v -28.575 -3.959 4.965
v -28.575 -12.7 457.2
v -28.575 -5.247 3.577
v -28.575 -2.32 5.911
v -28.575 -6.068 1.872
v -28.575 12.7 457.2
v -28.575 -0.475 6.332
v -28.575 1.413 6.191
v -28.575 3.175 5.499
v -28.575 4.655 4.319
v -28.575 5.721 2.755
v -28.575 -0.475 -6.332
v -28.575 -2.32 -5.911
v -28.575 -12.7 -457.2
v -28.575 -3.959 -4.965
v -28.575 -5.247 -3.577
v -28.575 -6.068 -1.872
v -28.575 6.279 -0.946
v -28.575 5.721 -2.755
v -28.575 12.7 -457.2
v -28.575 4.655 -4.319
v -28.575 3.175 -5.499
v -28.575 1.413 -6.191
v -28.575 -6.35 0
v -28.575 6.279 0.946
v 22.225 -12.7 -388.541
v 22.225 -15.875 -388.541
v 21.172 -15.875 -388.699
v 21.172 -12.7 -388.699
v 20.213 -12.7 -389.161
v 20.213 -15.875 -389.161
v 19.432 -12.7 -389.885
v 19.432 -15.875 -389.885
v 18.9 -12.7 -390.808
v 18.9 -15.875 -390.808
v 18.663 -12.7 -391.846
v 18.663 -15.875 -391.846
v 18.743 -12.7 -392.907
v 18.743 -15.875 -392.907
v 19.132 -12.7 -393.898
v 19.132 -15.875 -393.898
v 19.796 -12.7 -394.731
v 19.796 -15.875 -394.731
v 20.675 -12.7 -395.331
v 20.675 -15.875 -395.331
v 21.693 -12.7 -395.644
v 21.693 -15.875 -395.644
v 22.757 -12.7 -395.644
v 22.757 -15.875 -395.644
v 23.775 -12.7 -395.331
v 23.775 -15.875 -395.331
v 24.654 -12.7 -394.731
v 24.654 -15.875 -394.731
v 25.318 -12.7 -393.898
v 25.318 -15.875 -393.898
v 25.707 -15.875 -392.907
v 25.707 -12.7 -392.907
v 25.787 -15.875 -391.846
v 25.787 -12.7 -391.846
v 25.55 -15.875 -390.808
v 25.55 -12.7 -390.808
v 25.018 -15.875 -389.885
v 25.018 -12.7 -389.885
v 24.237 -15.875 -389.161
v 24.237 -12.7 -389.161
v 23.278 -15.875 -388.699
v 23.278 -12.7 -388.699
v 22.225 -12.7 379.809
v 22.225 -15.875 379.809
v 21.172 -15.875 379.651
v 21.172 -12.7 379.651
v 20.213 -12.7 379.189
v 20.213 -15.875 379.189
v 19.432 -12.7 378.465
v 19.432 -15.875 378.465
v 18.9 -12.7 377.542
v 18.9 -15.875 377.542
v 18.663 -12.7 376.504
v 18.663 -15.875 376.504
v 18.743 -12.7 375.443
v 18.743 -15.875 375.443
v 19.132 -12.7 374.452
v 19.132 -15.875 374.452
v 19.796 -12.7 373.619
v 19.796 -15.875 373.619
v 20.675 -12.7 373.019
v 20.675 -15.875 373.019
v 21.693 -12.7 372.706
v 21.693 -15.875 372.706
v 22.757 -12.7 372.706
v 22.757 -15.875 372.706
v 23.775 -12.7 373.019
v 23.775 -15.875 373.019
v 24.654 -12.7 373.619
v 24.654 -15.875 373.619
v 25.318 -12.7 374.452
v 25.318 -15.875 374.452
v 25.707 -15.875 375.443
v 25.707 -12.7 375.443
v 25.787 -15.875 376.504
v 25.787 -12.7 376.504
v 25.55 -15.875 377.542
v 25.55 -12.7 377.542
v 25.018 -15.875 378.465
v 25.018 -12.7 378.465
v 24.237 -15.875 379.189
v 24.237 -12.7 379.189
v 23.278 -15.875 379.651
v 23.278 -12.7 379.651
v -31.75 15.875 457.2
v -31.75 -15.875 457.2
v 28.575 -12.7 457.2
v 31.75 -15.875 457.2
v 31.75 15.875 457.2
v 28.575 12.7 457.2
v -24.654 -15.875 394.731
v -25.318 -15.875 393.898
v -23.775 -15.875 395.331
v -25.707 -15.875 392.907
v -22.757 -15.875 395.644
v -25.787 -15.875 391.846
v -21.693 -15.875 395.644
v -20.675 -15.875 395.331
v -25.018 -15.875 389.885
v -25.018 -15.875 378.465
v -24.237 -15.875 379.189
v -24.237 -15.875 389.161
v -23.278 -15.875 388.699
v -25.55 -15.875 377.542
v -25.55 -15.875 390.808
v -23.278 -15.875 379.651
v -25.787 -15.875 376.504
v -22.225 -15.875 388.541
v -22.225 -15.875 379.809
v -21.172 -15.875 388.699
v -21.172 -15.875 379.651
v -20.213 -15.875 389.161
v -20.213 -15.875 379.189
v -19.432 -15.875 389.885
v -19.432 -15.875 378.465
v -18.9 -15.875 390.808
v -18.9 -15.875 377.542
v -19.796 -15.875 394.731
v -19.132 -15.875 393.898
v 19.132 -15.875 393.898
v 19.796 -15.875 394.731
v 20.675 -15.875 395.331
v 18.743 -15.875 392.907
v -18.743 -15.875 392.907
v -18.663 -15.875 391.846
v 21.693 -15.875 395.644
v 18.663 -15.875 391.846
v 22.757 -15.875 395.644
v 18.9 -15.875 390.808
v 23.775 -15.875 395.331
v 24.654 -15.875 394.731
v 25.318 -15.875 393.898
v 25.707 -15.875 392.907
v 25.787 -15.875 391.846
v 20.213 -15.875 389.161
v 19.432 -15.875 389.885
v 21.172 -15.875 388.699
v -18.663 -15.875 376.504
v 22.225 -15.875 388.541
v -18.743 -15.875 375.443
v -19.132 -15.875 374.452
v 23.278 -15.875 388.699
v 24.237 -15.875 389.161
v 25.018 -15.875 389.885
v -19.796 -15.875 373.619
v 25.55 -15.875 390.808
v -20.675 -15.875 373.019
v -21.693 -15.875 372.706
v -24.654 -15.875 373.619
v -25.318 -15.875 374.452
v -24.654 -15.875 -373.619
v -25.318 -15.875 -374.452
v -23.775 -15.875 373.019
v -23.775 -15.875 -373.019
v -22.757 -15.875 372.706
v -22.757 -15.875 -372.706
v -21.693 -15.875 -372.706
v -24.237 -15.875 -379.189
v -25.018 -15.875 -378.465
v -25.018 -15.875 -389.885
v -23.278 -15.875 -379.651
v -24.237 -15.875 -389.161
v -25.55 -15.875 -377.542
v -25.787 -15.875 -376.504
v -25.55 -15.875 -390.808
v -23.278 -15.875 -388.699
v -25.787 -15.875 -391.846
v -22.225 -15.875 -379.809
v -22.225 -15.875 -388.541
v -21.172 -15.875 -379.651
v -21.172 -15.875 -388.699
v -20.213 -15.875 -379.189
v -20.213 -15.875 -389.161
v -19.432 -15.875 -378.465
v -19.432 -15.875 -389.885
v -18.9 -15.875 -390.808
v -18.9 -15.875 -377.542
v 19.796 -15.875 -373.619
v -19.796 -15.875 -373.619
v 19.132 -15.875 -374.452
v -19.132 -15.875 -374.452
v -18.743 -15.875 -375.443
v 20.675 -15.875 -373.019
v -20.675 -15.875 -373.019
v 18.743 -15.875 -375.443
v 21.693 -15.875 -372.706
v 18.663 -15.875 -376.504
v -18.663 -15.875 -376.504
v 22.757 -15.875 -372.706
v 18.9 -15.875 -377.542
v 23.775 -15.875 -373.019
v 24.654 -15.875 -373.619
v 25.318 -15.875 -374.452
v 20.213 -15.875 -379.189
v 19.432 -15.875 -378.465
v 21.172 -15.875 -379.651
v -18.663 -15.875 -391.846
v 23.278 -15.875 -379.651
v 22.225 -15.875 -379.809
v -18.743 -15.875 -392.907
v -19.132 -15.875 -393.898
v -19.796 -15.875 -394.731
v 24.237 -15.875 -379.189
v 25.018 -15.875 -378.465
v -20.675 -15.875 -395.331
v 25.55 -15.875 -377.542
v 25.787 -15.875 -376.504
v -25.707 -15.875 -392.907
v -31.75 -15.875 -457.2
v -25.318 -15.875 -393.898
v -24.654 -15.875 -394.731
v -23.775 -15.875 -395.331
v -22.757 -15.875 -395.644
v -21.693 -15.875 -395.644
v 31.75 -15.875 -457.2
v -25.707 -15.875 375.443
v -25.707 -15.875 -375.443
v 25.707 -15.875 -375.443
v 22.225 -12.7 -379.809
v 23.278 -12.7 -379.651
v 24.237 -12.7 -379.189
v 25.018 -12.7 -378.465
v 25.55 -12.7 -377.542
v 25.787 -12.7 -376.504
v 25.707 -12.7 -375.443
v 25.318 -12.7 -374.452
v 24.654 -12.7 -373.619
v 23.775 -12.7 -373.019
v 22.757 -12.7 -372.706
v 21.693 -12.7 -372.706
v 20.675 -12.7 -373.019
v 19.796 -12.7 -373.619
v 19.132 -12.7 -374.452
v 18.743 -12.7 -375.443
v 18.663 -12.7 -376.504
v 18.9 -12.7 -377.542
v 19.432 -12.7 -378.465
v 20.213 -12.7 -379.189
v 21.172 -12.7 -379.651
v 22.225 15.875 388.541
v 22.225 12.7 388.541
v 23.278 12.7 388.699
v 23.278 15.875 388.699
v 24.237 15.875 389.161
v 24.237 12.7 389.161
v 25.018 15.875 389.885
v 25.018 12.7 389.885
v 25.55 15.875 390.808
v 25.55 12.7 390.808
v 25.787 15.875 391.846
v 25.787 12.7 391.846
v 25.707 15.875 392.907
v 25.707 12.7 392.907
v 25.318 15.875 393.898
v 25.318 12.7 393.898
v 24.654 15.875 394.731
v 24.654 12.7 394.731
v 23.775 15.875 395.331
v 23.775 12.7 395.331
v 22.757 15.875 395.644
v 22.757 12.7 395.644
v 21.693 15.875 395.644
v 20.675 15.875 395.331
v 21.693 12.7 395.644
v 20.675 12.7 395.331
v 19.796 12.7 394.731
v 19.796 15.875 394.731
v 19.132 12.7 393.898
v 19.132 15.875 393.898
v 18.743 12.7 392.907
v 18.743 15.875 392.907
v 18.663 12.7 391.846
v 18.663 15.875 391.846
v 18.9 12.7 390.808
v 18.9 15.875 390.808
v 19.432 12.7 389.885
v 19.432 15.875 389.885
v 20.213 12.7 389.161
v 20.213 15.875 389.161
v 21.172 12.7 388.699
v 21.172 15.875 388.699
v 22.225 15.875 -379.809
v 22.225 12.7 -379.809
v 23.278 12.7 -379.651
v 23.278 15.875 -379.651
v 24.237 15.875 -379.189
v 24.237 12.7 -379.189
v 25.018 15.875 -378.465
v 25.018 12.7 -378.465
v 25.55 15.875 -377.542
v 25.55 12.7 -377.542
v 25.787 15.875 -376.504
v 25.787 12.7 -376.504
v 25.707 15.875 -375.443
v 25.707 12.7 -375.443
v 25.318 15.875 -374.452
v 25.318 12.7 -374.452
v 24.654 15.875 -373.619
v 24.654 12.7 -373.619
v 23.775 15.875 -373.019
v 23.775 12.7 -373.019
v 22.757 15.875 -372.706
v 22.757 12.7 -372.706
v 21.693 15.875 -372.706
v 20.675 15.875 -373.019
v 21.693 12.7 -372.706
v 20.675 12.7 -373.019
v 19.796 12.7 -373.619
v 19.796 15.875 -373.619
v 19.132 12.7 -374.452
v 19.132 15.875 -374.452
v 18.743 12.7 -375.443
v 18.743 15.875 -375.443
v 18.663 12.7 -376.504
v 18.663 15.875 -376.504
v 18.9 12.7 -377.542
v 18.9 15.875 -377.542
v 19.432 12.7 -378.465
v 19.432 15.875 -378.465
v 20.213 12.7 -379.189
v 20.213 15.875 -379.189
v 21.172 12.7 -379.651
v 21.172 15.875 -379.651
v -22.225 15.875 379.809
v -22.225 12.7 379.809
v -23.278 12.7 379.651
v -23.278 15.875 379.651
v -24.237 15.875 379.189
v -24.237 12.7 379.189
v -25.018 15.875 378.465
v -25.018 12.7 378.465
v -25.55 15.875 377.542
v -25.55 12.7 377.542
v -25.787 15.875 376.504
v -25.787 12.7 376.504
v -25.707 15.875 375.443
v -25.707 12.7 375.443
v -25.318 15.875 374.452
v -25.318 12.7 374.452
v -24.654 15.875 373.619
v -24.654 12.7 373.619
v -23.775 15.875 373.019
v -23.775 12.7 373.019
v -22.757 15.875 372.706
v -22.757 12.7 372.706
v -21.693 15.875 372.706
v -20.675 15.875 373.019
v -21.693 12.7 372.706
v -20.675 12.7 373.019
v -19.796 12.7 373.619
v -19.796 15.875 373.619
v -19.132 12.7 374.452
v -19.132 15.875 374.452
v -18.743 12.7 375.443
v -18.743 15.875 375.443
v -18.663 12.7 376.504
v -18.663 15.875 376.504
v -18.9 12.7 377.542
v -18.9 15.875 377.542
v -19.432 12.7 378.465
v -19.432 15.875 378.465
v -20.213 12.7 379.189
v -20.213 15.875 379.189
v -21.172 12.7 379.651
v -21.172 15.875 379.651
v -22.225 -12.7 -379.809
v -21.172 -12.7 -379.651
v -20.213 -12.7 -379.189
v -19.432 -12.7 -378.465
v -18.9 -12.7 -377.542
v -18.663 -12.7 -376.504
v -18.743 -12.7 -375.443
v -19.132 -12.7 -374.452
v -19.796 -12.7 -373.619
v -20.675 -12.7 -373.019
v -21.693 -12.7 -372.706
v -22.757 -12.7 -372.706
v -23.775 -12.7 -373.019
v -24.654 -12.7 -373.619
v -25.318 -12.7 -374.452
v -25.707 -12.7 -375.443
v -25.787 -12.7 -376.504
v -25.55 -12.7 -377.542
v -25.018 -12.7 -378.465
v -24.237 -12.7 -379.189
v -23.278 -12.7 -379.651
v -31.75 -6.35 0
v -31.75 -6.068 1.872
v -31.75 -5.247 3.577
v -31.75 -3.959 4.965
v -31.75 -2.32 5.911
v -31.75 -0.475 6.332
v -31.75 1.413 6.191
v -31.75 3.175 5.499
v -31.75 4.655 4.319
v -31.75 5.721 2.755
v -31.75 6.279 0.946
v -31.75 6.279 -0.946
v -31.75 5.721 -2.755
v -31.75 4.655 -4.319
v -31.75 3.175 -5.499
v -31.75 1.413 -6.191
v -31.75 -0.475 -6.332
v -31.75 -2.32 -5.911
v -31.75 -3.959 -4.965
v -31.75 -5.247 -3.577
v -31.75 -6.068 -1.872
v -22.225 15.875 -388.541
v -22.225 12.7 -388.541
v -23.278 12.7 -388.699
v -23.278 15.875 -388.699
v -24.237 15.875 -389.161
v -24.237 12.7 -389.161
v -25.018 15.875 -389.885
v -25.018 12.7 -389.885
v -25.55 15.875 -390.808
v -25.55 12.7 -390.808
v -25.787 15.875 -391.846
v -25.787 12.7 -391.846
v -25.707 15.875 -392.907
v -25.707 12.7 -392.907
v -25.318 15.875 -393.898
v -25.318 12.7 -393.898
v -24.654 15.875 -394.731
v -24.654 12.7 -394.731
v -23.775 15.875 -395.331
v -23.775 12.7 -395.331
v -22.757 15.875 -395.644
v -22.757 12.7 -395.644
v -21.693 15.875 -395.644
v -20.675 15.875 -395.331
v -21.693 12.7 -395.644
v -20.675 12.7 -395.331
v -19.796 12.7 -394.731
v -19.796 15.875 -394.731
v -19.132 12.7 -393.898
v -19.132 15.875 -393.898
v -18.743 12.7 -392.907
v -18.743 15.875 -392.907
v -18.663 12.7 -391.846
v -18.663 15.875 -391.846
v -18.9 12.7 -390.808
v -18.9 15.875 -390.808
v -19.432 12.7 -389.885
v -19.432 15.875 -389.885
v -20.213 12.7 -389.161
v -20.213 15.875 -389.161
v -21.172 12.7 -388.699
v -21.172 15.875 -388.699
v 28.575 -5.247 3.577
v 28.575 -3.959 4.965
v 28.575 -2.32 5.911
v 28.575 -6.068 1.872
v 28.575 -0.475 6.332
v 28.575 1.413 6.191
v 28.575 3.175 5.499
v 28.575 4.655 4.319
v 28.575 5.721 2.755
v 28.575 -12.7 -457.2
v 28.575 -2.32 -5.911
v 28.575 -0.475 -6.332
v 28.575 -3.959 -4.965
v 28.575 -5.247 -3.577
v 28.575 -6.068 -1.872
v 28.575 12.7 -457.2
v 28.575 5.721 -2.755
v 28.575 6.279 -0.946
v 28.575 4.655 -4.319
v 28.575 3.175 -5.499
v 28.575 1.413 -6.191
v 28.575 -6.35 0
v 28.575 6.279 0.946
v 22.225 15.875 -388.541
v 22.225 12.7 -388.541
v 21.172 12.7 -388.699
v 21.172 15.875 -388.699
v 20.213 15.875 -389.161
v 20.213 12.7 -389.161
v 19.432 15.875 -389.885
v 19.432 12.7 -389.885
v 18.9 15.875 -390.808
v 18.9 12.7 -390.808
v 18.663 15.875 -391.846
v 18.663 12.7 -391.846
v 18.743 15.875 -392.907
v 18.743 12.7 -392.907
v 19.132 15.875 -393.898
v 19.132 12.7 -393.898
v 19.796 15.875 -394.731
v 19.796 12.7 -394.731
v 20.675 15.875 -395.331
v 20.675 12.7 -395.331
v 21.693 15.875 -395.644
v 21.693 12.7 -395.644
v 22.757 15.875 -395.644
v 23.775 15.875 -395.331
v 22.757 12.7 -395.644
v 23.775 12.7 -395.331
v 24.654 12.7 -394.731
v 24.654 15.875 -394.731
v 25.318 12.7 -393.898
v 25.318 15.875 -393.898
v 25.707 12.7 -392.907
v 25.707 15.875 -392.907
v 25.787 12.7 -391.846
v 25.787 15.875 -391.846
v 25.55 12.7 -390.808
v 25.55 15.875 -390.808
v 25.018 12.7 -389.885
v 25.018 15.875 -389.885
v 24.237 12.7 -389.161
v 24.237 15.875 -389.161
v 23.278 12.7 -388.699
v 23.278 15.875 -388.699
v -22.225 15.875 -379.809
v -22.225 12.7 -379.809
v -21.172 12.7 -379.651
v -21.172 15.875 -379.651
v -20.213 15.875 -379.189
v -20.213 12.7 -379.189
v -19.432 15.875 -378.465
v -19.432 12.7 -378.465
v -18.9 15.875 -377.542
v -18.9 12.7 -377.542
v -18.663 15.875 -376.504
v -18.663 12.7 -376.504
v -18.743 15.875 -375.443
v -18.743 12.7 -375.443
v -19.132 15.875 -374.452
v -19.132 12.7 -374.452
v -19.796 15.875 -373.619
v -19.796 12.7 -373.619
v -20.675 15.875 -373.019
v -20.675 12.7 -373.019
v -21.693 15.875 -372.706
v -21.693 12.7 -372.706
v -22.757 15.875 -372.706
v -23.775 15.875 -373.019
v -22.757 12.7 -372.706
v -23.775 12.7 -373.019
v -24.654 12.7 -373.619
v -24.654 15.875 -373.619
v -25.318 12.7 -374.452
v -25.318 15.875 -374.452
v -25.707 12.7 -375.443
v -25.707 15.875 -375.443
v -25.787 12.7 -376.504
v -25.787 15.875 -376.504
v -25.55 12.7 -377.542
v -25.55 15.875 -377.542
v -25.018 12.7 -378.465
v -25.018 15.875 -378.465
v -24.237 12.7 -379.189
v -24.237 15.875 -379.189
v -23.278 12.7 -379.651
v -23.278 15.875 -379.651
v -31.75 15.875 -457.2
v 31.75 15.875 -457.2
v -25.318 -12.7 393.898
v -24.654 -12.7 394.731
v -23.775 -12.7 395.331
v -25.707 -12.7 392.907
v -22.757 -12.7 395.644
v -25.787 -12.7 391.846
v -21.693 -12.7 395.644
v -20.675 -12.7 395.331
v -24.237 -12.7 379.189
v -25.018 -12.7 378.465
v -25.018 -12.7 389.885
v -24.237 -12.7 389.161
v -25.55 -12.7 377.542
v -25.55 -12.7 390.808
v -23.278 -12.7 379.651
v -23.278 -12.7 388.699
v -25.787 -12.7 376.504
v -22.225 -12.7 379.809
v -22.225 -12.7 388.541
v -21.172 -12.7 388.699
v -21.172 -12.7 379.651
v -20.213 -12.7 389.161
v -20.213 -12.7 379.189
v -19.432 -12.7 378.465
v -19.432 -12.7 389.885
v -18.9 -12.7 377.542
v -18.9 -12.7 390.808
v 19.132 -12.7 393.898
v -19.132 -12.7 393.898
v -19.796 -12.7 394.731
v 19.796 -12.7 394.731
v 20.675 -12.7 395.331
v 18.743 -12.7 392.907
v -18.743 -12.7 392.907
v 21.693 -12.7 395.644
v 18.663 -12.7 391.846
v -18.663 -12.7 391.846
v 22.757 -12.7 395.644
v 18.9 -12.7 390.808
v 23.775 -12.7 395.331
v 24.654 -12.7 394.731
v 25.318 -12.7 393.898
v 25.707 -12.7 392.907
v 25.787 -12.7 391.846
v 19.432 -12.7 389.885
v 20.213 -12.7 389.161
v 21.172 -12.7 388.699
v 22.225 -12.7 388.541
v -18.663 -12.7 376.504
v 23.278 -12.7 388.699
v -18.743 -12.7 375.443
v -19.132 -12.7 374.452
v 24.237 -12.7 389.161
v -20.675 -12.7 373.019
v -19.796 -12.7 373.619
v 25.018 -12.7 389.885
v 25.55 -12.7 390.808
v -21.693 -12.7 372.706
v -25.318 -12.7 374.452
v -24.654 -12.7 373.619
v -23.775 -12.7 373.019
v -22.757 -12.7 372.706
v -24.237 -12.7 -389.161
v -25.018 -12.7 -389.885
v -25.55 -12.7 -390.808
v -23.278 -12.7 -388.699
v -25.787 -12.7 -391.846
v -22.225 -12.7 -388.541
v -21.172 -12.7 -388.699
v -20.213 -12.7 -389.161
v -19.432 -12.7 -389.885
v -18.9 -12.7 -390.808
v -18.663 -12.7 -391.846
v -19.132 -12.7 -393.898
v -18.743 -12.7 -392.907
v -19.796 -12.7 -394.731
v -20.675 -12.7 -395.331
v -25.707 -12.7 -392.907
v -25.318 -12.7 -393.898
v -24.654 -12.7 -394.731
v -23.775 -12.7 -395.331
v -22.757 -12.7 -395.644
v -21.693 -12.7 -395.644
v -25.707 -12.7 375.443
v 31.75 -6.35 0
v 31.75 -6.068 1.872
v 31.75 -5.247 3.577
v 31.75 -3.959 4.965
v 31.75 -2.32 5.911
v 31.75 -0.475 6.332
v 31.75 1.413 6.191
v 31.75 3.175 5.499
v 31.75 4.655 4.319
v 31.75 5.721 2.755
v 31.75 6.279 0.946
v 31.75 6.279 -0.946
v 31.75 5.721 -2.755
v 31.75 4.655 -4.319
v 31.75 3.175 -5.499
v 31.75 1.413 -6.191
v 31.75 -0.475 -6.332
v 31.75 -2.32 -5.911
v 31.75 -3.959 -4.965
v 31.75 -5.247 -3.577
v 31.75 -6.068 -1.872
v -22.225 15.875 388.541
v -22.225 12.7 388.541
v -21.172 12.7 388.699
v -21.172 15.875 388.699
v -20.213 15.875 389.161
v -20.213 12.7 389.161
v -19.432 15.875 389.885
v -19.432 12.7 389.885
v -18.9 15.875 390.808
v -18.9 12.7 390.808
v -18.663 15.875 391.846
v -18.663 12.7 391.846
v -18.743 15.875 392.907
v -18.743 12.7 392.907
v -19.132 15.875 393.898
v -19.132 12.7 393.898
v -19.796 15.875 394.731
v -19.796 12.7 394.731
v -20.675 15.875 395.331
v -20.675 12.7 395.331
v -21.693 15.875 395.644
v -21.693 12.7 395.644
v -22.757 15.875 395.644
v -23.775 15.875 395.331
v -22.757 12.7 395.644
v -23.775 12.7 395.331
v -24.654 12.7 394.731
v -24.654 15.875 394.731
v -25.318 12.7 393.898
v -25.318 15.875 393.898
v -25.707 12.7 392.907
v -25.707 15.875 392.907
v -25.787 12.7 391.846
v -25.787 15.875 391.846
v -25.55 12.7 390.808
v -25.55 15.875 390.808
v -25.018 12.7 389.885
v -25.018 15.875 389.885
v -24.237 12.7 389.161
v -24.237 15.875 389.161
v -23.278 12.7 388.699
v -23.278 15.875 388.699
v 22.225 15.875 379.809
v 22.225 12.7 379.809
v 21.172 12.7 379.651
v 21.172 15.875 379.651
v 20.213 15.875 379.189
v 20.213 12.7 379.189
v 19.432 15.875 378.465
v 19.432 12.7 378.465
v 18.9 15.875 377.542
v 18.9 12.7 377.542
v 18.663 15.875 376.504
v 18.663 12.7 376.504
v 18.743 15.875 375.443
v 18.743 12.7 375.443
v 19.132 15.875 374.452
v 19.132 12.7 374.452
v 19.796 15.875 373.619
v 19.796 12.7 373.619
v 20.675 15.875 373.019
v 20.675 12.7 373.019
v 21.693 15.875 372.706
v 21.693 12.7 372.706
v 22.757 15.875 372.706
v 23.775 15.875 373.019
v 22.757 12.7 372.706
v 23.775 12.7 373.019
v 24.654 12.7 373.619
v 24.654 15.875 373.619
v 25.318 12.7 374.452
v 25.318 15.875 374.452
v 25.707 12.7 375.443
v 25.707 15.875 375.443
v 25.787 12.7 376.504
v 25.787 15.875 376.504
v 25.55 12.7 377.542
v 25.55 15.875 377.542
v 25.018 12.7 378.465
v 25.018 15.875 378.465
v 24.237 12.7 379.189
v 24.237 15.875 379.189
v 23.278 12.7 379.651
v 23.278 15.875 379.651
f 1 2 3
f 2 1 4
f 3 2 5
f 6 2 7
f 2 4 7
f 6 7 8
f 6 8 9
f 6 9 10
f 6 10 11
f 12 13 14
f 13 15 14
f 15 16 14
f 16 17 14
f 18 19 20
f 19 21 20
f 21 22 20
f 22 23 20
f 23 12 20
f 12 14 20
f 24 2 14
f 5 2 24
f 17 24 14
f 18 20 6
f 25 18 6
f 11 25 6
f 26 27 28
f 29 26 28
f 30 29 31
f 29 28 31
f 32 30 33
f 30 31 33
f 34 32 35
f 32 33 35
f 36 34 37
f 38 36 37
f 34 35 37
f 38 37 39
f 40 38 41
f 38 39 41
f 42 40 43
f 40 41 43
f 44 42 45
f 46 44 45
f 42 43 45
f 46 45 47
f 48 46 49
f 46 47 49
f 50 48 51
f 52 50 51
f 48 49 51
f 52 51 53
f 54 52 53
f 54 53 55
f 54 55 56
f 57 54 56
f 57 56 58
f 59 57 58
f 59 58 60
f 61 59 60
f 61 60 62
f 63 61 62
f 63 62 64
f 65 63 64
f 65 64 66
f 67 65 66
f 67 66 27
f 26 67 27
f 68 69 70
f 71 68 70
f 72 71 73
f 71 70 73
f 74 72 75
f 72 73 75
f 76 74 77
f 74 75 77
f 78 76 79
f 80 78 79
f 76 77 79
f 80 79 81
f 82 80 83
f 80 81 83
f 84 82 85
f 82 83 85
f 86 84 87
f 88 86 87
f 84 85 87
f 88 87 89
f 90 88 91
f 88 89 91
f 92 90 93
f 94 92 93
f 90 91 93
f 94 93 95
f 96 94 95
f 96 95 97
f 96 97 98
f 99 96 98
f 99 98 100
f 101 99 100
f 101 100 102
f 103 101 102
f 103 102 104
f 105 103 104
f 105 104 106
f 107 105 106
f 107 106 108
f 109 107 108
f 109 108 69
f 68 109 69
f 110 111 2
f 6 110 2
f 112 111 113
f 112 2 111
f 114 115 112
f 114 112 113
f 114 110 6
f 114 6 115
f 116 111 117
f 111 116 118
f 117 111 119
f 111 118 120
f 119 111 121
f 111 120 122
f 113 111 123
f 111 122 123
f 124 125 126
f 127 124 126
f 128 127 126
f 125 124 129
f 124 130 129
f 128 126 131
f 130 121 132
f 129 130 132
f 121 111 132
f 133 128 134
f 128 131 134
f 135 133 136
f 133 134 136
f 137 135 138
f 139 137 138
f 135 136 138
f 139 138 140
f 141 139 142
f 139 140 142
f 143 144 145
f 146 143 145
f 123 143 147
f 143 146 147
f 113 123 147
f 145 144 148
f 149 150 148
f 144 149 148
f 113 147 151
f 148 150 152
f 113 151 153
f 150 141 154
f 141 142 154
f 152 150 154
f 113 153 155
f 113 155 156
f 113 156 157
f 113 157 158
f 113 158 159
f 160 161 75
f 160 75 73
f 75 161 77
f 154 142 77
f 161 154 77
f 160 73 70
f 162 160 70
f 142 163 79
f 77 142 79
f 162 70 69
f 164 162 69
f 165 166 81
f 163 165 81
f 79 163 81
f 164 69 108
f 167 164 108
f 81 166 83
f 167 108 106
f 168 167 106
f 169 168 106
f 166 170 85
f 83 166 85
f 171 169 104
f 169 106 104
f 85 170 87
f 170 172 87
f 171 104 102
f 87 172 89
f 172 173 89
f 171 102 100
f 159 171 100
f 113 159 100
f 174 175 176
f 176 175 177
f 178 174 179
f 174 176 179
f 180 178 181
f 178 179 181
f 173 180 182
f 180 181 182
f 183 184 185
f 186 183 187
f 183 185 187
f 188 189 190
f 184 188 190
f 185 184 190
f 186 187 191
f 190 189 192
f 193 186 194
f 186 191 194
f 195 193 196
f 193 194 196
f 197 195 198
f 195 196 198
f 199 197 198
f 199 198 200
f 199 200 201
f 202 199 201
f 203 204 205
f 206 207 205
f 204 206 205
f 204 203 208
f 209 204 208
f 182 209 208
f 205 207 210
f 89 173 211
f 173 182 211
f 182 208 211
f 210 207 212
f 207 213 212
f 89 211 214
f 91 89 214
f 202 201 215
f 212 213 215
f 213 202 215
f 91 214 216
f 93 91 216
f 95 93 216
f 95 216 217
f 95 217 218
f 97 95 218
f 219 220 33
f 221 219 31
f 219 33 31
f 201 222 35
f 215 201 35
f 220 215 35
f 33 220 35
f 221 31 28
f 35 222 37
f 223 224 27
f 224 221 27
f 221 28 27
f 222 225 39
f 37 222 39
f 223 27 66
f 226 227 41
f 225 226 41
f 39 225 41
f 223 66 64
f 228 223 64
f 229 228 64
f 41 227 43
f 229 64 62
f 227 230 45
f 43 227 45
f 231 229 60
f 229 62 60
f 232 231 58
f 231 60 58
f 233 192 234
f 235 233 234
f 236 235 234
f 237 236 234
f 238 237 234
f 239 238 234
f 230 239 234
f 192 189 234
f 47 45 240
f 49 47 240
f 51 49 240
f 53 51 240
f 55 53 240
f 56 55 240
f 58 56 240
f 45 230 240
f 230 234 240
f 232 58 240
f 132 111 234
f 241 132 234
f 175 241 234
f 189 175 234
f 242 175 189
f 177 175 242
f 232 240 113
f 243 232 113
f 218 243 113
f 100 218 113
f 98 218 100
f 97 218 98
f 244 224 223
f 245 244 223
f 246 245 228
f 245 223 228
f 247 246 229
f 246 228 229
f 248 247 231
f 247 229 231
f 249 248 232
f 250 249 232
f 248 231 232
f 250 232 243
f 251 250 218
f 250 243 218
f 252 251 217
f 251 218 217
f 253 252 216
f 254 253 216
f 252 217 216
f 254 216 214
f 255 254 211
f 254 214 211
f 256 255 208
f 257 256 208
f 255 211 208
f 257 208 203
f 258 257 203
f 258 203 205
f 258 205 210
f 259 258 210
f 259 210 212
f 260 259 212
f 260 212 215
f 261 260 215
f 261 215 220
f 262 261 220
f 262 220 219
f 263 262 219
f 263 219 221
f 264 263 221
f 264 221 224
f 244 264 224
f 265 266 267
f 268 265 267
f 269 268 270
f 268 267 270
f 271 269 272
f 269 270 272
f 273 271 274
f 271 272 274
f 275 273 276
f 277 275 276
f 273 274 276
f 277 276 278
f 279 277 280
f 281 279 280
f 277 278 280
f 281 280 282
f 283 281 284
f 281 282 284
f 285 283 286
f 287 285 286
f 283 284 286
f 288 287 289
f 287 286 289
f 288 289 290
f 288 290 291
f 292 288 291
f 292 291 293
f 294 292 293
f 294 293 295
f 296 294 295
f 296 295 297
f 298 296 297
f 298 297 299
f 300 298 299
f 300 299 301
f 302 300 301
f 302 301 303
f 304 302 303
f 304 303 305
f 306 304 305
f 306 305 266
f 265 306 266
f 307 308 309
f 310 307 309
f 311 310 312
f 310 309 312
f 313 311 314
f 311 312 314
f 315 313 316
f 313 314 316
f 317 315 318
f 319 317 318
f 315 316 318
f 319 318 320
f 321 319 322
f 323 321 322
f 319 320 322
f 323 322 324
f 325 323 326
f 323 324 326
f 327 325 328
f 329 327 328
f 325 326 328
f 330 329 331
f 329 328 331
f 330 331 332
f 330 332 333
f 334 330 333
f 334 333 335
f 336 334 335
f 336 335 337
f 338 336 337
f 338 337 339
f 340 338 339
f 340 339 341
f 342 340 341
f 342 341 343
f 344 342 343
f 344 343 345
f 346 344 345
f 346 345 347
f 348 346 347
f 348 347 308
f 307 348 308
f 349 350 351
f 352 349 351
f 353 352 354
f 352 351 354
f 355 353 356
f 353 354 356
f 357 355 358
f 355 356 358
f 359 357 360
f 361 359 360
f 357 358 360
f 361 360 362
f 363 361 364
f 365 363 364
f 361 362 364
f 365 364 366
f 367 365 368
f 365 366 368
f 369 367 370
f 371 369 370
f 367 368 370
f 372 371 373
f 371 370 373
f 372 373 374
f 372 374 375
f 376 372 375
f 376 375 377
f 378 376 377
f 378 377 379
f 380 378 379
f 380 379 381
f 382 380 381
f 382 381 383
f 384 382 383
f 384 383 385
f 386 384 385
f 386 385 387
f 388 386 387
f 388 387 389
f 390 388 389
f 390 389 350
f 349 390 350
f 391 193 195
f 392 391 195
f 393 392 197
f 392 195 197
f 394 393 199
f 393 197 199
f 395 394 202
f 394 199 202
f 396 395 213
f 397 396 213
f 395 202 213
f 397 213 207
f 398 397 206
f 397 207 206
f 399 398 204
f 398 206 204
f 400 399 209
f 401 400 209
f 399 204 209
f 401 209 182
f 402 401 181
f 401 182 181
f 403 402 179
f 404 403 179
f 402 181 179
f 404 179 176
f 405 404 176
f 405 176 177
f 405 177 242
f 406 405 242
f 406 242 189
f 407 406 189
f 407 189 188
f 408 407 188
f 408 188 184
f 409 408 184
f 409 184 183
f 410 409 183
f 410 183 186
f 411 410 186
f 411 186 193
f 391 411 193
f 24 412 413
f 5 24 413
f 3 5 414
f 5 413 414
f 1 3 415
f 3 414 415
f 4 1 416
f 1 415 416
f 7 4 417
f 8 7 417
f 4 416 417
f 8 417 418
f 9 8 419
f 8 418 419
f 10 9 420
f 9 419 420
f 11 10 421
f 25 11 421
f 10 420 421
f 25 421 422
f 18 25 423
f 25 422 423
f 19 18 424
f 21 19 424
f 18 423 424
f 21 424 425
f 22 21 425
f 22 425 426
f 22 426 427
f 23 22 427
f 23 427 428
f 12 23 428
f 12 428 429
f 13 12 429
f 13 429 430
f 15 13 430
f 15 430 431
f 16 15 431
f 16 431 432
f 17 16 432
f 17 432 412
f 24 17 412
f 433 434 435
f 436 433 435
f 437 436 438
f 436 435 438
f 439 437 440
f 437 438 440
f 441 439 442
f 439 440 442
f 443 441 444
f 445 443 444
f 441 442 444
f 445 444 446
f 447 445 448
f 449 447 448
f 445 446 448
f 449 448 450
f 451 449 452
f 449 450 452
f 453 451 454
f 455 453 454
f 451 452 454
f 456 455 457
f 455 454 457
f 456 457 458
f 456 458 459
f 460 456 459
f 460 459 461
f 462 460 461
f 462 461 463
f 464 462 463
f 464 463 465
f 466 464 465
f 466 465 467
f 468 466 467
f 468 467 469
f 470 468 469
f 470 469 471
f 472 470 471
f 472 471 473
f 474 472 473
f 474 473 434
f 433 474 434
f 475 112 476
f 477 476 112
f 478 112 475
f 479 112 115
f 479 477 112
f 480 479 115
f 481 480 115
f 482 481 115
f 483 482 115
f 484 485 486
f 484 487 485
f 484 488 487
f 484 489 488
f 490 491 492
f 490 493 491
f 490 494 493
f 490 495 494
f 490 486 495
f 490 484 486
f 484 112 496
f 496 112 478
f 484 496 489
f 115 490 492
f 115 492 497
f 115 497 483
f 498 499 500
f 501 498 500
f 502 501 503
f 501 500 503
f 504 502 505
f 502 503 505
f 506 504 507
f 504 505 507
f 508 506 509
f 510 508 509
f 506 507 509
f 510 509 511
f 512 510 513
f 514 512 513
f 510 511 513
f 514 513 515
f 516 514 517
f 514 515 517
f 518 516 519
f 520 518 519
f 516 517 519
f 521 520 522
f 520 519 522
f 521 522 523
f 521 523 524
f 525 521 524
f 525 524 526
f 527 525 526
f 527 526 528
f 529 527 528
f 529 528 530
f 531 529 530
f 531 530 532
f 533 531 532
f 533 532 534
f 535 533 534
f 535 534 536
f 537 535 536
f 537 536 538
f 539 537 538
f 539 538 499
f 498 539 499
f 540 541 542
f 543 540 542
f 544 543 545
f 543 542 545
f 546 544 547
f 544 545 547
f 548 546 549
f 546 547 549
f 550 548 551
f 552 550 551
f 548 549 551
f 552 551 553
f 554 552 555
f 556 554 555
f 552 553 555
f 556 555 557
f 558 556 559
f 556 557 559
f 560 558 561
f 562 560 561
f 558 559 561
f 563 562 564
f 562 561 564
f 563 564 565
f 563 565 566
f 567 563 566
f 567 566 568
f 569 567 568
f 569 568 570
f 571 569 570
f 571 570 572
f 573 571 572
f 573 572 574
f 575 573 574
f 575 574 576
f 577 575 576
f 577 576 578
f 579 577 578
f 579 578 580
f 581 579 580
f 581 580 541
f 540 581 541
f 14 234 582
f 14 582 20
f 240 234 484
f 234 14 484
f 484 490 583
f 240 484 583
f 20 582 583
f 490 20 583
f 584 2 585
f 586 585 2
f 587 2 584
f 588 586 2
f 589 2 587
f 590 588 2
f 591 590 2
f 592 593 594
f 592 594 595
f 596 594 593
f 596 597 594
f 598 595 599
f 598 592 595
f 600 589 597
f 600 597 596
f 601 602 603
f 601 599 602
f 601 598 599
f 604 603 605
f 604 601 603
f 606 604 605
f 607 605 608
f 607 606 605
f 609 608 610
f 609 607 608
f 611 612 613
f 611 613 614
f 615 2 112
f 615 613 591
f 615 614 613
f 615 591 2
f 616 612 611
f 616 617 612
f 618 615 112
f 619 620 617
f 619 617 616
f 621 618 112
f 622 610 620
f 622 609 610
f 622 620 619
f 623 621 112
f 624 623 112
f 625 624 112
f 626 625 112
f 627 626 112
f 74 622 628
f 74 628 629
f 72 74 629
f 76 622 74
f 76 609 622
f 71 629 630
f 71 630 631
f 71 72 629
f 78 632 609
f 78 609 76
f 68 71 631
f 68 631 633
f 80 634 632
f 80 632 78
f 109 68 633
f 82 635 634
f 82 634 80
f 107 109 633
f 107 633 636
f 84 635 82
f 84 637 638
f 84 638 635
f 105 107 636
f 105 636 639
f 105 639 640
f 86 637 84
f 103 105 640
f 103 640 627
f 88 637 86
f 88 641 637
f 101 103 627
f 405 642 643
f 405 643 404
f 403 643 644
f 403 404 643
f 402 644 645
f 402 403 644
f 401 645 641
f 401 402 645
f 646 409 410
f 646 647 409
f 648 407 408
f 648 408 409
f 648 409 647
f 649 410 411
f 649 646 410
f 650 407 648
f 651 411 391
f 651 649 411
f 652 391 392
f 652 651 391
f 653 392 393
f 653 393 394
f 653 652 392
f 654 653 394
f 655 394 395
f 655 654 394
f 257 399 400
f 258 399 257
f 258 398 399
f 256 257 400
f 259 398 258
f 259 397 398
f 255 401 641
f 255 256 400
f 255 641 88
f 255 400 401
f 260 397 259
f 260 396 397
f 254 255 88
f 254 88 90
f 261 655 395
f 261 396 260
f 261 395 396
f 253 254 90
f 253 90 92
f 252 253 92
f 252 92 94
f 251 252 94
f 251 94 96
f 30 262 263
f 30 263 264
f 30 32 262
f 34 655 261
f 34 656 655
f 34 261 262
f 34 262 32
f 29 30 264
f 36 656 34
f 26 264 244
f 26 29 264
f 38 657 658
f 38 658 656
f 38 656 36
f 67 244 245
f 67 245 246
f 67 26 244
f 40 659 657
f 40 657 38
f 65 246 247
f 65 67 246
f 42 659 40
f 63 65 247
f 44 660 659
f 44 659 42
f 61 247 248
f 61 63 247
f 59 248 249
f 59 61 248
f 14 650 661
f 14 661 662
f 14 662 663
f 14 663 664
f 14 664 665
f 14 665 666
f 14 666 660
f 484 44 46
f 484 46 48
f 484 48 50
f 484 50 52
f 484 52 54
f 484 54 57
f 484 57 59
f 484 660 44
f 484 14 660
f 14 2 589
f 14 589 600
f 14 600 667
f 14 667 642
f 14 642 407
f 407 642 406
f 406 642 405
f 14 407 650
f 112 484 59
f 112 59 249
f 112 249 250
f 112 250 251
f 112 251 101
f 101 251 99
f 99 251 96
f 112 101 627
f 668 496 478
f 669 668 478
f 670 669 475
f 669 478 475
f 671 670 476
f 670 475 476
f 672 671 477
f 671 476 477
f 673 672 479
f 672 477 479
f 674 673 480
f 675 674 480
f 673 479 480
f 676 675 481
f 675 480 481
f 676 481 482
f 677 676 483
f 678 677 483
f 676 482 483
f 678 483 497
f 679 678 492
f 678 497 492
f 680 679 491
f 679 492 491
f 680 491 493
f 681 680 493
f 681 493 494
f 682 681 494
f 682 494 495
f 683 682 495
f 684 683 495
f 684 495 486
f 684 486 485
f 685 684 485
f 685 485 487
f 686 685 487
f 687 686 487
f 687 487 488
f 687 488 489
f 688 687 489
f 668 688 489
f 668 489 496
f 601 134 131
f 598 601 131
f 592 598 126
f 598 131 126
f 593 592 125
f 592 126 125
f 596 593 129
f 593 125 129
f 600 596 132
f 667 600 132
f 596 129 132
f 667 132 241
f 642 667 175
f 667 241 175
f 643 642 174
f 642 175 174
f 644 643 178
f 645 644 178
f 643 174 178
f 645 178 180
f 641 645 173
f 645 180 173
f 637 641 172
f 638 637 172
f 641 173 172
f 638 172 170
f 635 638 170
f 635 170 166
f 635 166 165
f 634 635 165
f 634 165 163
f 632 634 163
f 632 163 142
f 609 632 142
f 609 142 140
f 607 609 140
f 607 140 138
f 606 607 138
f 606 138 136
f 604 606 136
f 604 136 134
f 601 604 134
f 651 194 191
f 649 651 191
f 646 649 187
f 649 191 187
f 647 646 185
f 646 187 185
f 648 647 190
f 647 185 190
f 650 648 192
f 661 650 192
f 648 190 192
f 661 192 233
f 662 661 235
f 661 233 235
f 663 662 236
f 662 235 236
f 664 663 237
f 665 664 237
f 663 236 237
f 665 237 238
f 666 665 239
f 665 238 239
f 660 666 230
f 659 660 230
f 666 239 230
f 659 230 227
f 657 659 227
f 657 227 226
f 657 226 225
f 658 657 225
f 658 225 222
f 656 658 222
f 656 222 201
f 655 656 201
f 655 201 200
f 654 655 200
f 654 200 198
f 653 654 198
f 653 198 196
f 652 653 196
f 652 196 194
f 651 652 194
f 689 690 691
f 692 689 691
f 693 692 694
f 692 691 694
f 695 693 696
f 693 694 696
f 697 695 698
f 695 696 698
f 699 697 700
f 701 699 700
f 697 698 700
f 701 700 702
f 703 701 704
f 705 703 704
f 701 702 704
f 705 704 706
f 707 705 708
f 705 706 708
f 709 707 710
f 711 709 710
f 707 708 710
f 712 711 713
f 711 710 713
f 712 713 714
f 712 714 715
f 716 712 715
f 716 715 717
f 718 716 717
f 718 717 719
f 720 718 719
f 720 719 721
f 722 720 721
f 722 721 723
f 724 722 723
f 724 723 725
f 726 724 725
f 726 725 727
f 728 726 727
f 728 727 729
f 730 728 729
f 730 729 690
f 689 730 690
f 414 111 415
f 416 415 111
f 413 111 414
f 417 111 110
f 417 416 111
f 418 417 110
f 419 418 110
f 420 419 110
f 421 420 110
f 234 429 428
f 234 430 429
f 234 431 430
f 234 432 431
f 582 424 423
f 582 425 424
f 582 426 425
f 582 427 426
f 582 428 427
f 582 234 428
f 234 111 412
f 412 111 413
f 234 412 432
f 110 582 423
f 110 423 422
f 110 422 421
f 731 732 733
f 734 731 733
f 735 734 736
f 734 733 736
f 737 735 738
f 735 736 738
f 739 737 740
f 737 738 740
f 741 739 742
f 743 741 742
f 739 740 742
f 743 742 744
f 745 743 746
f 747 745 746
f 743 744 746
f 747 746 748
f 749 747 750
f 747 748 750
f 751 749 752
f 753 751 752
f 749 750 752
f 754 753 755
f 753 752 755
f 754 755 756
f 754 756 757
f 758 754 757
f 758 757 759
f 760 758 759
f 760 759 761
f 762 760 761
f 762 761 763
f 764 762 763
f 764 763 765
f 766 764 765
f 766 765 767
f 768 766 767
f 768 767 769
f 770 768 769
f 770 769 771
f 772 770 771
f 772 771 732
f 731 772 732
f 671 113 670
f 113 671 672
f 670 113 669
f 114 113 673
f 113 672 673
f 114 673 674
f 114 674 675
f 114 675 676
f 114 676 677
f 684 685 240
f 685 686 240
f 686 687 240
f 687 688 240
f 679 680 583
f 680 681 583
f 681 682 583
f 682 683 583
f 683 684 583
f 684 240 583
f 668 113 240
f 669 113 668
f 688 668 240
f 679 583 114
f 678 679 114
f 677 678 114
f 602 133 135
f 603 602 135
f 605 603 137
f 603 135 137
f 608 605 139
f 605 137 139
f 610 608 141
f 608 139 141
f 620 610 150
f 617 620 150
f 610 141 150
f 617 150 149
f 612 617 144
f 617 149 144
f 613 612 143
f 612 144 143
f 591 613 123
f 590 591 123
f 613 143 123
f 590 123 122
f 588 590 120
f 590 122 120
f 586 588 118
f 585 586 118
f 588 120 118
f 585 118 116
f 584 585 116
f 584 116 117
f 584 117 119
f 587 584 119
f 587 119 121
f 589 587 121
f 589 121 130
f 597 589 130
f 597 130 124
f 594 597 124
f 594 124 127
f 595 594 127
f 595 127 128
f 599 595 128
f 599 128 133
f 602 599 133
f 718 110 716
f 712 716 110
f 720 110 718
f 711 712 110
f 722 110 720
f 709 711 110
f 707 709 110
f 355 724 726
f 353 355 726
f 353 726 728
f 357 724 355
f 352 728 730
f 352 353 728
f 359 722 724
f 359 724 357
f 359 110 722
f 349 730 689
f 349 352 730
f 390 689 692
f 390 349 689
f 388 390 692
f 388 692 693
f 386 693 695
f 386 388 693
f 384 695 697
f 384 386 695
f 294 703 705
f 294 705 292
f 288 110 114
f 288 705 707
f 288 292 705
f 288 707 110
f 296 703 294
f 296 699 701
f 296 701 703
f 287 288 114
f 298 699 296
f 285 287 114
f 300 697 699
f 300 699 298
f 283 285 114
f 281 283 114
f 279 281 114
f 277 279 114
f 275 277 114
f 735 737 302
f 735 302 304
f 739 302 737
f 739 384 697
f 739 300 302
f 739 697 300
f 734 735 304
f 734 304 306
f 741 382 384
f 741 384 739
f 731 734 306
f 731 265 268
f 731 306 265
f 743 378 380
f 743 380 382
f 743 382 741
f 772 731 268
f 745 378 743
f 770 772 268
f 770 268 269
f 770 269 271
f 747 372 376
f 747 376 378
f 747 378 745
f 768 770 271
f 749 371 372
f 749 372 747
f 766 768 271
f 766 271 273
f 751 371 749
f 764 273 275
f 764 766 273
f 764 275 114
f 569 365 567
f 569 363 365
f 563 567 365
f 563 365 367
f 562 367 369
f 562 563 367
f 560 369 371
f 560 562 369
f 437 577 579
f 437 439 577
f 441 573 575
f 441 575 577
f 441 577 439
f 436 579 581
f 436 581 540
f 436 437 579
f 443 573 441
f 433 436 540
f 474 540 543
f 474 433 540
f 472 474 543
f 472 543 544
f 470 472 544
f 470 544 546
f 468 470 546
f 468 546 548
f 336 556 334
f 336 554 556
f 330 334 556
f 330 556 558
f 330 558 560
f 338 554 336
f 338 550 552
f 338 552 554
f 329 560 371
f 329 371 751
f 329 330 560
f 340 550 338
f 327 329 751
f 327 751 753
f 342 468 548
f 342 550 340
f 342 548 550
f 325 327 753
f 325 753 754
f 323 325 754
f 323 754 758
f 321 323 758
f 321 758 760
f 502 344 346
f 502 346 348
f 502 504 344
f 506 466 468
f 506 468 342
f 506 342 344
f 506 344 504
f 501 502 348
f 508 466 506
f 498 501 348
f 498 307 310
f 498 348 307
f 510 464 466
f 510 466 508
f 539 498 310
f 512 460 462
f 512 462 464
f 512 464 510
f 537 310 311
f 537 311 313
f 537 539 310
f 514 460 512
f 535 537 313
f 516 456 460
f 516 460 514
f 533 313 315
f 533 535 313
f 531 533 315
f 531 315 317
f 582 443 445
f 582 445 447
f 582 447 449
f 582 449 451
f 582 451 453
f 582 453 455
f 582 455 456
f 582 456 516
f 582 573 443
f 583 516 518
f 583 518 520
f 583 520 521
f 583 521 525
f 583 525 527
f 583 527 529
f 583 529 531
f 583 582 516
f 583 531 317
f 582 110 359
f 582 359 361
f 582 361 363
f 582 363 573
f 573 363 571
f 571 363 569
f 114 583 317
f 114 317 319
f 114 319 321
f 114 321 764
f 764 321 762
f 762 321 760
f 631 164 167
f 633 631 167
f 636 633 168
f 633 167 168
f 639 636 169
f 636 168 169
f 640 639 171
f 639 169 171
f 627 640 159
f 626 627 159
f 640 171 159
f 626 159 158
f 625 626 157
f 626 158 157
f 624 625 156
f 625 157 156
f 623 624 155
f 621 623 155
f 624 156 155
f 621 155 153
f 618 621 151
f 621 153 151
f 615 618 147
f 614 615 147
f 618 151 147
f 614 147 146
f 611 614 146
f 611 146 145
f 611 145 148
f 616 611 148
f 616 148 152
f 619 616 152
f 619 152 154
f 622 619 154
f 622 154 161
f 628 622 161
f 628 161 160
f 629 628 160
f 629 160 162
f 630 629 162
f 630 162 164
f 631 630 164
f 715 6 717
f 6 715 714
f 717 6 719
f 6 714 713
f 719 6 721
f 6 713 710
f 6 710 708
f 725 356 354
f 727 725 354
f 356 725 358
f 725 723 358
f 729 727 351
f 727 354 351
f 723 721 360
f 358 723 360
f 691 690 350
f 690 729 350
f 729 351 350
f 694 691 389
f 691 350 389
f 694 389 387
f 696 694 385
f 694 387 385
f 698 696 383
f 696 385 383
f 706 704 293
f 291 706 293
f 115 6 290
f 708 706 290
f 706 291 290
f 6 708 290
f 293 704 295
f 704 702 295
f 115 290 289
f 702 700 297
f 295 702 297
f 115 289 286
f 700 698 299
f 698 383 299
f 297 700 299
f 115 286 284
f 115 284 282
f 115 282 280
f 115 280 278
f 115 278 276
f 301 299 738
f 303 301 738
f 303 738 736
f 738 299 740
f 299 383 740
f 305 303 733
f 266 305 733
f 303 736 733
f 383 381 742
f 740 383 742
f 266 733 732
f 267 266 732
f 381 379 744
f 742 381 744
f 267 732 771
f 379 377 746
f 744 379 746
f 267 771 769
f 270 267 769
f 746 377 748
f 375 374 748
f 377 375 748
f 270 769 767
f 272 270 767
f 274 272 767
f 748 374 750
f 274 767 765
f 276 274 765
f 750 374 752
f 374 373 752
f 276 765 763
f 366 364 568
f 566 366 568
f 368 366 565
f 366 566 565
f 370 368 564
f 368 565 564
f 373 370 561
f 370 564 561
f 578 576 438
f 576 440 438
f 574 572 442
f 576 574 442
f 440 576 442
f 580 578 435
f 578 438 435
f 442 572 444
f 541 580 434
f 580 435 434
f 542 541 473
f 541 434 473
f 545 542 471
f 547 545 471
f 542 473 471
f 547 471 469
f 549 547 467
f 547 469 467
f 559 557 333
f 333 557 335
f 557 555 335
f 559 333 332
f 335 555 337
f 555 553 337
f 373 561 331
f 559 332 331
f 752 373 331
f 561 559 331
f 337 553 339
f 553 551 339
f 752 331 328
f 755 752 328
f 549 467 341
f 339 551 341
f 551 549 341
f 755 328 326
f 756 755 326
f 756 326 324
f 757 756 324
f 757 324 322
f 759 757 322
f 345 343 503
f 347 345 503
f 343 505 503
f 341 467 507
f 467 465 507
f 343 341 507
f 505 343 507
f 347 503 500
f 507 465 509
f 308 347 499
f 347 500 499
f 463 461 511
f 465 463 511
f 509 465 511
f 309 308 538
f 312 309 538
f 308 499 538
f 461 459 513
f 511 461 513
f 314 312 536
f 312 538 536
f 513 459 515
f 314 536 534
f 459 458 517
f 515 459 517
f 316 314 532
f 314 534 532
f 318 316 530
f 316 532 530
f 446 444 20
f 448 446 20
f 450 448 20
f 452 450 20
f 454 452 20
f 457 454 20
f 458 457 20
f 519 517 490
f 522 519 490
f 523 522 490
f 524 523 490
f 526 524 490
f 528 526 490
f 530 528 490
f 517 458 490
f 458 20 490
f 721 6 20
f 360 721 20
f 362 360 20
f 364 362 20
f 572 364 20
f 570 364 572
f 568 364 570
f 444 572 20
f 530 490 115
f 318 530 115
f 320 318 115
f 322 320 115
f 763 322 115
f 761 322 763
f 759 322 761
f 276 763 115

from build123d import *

# Parameters (mm, degrees)
BOSS_EXTRUDE1_DEPTH      = 457.2
BOSS_EXTRUDE1_DEPTH_BACK = 457.2
SKETCH3_W                = 63.5
SKETCH3_H                = 31.75
SKETCH3_W_2              = 57.15
SKETCH3_H_2              = 25.4
SKETCH5_R                = 3.571875
CUT_EXTRUDE1_DEPTH       = 460.399570091
SKETCH6_R                = 6.35
CUT_EXTRUDE2_DEPTH       = 462.861565434


with BuildPart() as part:
    # Sketch3 → Boss-Extrude1 (new, two sides: drawn at the far end of the back side and taken through both)
    with BuildSketch(Plane.XY.offset(-BOSS_EXTRUDE1_DEPTH_BACK)):
        Rectangle(SKETCH3_W, SKETCH3_H)
        Rectangle(SKETCH3_W_2, SKETCH3_H_2, mode=Mode.SUBTRACT)
    extrude(amount=BOSS_EXTRUDE1_DEPTH + BOSS_EXTRUDE1_DEPTH_BACK)

    # Sketch5 → Cut-Extrude1 (cut, through all)
    with BuildSketch(Plane.XZ.offset(15.875)):
        with Locations(Location((-22.225, 392.1125, 0), (0, 0, 270))):
            Circle(SKETCH5_R)
        with Locations(Location((22.225, 392.1125, 0), (0, 0, 270))):
            Circle(SKETCH5_R)
        with Locations(Location((22.225, -392.1125, 0), (0, 0, 90))):
            Circle(SKETCH5_R)
        with Locations(Location((-22.225, -392.1125, 0), (0, 0, 90))):
            Circle(SKETCH5_R)
        with Locations(Location((22.225, 376.2375, 0), (0, 0, 90))):
            Circle(SKETCH5_R)
        with Locations(Location((-22.225, 376.2375, 0), (0, 0, 90))):
            Circle(SKETCH5_R)
        with Locations(Location((22.225, -376.2375, 0), (0, 0, 270))):
            Circle(SKETCH5_R)
        with Locations(Location((-22.225, -376.2375, 0), (0, 0, 270))):
            Circle(SKETCH5_R)
    extrude(amount=-CUT_EXTRUDE1_DEPTH, mode=Mode.SUBTRACT)

    # Sketch6 → Cut-Extrude2 (cut, through all)
    with BuildSketch(Plane.ZY.offset(31.75)):
        with Locations(Location((0, 0, 0), (0, 0, 270))):
            Circle(SKETCH6_R)
    extrude(amount=-CUT_EXTRUDE2_DEPTH, mode=Mode.SUBTRACT)


solid = part.part
